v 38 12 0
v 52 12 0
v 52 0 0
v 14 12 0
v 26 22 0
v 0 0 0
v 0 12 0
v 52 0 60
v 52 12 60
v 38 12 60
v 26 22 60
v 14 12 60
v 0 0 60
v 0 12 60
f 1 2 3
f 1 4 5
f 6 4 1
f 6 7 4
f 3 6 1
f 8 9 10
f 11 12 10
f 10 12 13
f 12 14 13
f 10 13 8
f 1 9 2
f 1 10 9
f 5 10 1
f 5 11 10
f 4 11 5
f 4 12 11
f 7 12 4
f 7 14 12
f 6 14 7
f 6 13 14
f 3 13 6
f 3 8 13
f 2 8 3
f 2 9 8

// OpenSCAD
$fn = 32;

// ----------------------------------------------------------------------
// V guide rail: vrib, 52 mm wide
// ----------------------------------------------------------------------

// --- parameters (mm) ---
rail_w = 52;              // rail width, X
base_t = 12;              // base plate thickness
v_depth = 10;             // V feature depth / height
v_half_w = 12;            // half width of the V at the base face
plate_t = 60;             // rail length, Z (the extrusion height)

profile = [[0, 0], [52, 0], [52, 12], [38, 12], [26, 22], [14, 12], [0, 12]];  // primary outline, 7 points, counter clockwise

// --- the one profile operation ---
linear_extrude(height = plate_t) polygon(points = profile);
